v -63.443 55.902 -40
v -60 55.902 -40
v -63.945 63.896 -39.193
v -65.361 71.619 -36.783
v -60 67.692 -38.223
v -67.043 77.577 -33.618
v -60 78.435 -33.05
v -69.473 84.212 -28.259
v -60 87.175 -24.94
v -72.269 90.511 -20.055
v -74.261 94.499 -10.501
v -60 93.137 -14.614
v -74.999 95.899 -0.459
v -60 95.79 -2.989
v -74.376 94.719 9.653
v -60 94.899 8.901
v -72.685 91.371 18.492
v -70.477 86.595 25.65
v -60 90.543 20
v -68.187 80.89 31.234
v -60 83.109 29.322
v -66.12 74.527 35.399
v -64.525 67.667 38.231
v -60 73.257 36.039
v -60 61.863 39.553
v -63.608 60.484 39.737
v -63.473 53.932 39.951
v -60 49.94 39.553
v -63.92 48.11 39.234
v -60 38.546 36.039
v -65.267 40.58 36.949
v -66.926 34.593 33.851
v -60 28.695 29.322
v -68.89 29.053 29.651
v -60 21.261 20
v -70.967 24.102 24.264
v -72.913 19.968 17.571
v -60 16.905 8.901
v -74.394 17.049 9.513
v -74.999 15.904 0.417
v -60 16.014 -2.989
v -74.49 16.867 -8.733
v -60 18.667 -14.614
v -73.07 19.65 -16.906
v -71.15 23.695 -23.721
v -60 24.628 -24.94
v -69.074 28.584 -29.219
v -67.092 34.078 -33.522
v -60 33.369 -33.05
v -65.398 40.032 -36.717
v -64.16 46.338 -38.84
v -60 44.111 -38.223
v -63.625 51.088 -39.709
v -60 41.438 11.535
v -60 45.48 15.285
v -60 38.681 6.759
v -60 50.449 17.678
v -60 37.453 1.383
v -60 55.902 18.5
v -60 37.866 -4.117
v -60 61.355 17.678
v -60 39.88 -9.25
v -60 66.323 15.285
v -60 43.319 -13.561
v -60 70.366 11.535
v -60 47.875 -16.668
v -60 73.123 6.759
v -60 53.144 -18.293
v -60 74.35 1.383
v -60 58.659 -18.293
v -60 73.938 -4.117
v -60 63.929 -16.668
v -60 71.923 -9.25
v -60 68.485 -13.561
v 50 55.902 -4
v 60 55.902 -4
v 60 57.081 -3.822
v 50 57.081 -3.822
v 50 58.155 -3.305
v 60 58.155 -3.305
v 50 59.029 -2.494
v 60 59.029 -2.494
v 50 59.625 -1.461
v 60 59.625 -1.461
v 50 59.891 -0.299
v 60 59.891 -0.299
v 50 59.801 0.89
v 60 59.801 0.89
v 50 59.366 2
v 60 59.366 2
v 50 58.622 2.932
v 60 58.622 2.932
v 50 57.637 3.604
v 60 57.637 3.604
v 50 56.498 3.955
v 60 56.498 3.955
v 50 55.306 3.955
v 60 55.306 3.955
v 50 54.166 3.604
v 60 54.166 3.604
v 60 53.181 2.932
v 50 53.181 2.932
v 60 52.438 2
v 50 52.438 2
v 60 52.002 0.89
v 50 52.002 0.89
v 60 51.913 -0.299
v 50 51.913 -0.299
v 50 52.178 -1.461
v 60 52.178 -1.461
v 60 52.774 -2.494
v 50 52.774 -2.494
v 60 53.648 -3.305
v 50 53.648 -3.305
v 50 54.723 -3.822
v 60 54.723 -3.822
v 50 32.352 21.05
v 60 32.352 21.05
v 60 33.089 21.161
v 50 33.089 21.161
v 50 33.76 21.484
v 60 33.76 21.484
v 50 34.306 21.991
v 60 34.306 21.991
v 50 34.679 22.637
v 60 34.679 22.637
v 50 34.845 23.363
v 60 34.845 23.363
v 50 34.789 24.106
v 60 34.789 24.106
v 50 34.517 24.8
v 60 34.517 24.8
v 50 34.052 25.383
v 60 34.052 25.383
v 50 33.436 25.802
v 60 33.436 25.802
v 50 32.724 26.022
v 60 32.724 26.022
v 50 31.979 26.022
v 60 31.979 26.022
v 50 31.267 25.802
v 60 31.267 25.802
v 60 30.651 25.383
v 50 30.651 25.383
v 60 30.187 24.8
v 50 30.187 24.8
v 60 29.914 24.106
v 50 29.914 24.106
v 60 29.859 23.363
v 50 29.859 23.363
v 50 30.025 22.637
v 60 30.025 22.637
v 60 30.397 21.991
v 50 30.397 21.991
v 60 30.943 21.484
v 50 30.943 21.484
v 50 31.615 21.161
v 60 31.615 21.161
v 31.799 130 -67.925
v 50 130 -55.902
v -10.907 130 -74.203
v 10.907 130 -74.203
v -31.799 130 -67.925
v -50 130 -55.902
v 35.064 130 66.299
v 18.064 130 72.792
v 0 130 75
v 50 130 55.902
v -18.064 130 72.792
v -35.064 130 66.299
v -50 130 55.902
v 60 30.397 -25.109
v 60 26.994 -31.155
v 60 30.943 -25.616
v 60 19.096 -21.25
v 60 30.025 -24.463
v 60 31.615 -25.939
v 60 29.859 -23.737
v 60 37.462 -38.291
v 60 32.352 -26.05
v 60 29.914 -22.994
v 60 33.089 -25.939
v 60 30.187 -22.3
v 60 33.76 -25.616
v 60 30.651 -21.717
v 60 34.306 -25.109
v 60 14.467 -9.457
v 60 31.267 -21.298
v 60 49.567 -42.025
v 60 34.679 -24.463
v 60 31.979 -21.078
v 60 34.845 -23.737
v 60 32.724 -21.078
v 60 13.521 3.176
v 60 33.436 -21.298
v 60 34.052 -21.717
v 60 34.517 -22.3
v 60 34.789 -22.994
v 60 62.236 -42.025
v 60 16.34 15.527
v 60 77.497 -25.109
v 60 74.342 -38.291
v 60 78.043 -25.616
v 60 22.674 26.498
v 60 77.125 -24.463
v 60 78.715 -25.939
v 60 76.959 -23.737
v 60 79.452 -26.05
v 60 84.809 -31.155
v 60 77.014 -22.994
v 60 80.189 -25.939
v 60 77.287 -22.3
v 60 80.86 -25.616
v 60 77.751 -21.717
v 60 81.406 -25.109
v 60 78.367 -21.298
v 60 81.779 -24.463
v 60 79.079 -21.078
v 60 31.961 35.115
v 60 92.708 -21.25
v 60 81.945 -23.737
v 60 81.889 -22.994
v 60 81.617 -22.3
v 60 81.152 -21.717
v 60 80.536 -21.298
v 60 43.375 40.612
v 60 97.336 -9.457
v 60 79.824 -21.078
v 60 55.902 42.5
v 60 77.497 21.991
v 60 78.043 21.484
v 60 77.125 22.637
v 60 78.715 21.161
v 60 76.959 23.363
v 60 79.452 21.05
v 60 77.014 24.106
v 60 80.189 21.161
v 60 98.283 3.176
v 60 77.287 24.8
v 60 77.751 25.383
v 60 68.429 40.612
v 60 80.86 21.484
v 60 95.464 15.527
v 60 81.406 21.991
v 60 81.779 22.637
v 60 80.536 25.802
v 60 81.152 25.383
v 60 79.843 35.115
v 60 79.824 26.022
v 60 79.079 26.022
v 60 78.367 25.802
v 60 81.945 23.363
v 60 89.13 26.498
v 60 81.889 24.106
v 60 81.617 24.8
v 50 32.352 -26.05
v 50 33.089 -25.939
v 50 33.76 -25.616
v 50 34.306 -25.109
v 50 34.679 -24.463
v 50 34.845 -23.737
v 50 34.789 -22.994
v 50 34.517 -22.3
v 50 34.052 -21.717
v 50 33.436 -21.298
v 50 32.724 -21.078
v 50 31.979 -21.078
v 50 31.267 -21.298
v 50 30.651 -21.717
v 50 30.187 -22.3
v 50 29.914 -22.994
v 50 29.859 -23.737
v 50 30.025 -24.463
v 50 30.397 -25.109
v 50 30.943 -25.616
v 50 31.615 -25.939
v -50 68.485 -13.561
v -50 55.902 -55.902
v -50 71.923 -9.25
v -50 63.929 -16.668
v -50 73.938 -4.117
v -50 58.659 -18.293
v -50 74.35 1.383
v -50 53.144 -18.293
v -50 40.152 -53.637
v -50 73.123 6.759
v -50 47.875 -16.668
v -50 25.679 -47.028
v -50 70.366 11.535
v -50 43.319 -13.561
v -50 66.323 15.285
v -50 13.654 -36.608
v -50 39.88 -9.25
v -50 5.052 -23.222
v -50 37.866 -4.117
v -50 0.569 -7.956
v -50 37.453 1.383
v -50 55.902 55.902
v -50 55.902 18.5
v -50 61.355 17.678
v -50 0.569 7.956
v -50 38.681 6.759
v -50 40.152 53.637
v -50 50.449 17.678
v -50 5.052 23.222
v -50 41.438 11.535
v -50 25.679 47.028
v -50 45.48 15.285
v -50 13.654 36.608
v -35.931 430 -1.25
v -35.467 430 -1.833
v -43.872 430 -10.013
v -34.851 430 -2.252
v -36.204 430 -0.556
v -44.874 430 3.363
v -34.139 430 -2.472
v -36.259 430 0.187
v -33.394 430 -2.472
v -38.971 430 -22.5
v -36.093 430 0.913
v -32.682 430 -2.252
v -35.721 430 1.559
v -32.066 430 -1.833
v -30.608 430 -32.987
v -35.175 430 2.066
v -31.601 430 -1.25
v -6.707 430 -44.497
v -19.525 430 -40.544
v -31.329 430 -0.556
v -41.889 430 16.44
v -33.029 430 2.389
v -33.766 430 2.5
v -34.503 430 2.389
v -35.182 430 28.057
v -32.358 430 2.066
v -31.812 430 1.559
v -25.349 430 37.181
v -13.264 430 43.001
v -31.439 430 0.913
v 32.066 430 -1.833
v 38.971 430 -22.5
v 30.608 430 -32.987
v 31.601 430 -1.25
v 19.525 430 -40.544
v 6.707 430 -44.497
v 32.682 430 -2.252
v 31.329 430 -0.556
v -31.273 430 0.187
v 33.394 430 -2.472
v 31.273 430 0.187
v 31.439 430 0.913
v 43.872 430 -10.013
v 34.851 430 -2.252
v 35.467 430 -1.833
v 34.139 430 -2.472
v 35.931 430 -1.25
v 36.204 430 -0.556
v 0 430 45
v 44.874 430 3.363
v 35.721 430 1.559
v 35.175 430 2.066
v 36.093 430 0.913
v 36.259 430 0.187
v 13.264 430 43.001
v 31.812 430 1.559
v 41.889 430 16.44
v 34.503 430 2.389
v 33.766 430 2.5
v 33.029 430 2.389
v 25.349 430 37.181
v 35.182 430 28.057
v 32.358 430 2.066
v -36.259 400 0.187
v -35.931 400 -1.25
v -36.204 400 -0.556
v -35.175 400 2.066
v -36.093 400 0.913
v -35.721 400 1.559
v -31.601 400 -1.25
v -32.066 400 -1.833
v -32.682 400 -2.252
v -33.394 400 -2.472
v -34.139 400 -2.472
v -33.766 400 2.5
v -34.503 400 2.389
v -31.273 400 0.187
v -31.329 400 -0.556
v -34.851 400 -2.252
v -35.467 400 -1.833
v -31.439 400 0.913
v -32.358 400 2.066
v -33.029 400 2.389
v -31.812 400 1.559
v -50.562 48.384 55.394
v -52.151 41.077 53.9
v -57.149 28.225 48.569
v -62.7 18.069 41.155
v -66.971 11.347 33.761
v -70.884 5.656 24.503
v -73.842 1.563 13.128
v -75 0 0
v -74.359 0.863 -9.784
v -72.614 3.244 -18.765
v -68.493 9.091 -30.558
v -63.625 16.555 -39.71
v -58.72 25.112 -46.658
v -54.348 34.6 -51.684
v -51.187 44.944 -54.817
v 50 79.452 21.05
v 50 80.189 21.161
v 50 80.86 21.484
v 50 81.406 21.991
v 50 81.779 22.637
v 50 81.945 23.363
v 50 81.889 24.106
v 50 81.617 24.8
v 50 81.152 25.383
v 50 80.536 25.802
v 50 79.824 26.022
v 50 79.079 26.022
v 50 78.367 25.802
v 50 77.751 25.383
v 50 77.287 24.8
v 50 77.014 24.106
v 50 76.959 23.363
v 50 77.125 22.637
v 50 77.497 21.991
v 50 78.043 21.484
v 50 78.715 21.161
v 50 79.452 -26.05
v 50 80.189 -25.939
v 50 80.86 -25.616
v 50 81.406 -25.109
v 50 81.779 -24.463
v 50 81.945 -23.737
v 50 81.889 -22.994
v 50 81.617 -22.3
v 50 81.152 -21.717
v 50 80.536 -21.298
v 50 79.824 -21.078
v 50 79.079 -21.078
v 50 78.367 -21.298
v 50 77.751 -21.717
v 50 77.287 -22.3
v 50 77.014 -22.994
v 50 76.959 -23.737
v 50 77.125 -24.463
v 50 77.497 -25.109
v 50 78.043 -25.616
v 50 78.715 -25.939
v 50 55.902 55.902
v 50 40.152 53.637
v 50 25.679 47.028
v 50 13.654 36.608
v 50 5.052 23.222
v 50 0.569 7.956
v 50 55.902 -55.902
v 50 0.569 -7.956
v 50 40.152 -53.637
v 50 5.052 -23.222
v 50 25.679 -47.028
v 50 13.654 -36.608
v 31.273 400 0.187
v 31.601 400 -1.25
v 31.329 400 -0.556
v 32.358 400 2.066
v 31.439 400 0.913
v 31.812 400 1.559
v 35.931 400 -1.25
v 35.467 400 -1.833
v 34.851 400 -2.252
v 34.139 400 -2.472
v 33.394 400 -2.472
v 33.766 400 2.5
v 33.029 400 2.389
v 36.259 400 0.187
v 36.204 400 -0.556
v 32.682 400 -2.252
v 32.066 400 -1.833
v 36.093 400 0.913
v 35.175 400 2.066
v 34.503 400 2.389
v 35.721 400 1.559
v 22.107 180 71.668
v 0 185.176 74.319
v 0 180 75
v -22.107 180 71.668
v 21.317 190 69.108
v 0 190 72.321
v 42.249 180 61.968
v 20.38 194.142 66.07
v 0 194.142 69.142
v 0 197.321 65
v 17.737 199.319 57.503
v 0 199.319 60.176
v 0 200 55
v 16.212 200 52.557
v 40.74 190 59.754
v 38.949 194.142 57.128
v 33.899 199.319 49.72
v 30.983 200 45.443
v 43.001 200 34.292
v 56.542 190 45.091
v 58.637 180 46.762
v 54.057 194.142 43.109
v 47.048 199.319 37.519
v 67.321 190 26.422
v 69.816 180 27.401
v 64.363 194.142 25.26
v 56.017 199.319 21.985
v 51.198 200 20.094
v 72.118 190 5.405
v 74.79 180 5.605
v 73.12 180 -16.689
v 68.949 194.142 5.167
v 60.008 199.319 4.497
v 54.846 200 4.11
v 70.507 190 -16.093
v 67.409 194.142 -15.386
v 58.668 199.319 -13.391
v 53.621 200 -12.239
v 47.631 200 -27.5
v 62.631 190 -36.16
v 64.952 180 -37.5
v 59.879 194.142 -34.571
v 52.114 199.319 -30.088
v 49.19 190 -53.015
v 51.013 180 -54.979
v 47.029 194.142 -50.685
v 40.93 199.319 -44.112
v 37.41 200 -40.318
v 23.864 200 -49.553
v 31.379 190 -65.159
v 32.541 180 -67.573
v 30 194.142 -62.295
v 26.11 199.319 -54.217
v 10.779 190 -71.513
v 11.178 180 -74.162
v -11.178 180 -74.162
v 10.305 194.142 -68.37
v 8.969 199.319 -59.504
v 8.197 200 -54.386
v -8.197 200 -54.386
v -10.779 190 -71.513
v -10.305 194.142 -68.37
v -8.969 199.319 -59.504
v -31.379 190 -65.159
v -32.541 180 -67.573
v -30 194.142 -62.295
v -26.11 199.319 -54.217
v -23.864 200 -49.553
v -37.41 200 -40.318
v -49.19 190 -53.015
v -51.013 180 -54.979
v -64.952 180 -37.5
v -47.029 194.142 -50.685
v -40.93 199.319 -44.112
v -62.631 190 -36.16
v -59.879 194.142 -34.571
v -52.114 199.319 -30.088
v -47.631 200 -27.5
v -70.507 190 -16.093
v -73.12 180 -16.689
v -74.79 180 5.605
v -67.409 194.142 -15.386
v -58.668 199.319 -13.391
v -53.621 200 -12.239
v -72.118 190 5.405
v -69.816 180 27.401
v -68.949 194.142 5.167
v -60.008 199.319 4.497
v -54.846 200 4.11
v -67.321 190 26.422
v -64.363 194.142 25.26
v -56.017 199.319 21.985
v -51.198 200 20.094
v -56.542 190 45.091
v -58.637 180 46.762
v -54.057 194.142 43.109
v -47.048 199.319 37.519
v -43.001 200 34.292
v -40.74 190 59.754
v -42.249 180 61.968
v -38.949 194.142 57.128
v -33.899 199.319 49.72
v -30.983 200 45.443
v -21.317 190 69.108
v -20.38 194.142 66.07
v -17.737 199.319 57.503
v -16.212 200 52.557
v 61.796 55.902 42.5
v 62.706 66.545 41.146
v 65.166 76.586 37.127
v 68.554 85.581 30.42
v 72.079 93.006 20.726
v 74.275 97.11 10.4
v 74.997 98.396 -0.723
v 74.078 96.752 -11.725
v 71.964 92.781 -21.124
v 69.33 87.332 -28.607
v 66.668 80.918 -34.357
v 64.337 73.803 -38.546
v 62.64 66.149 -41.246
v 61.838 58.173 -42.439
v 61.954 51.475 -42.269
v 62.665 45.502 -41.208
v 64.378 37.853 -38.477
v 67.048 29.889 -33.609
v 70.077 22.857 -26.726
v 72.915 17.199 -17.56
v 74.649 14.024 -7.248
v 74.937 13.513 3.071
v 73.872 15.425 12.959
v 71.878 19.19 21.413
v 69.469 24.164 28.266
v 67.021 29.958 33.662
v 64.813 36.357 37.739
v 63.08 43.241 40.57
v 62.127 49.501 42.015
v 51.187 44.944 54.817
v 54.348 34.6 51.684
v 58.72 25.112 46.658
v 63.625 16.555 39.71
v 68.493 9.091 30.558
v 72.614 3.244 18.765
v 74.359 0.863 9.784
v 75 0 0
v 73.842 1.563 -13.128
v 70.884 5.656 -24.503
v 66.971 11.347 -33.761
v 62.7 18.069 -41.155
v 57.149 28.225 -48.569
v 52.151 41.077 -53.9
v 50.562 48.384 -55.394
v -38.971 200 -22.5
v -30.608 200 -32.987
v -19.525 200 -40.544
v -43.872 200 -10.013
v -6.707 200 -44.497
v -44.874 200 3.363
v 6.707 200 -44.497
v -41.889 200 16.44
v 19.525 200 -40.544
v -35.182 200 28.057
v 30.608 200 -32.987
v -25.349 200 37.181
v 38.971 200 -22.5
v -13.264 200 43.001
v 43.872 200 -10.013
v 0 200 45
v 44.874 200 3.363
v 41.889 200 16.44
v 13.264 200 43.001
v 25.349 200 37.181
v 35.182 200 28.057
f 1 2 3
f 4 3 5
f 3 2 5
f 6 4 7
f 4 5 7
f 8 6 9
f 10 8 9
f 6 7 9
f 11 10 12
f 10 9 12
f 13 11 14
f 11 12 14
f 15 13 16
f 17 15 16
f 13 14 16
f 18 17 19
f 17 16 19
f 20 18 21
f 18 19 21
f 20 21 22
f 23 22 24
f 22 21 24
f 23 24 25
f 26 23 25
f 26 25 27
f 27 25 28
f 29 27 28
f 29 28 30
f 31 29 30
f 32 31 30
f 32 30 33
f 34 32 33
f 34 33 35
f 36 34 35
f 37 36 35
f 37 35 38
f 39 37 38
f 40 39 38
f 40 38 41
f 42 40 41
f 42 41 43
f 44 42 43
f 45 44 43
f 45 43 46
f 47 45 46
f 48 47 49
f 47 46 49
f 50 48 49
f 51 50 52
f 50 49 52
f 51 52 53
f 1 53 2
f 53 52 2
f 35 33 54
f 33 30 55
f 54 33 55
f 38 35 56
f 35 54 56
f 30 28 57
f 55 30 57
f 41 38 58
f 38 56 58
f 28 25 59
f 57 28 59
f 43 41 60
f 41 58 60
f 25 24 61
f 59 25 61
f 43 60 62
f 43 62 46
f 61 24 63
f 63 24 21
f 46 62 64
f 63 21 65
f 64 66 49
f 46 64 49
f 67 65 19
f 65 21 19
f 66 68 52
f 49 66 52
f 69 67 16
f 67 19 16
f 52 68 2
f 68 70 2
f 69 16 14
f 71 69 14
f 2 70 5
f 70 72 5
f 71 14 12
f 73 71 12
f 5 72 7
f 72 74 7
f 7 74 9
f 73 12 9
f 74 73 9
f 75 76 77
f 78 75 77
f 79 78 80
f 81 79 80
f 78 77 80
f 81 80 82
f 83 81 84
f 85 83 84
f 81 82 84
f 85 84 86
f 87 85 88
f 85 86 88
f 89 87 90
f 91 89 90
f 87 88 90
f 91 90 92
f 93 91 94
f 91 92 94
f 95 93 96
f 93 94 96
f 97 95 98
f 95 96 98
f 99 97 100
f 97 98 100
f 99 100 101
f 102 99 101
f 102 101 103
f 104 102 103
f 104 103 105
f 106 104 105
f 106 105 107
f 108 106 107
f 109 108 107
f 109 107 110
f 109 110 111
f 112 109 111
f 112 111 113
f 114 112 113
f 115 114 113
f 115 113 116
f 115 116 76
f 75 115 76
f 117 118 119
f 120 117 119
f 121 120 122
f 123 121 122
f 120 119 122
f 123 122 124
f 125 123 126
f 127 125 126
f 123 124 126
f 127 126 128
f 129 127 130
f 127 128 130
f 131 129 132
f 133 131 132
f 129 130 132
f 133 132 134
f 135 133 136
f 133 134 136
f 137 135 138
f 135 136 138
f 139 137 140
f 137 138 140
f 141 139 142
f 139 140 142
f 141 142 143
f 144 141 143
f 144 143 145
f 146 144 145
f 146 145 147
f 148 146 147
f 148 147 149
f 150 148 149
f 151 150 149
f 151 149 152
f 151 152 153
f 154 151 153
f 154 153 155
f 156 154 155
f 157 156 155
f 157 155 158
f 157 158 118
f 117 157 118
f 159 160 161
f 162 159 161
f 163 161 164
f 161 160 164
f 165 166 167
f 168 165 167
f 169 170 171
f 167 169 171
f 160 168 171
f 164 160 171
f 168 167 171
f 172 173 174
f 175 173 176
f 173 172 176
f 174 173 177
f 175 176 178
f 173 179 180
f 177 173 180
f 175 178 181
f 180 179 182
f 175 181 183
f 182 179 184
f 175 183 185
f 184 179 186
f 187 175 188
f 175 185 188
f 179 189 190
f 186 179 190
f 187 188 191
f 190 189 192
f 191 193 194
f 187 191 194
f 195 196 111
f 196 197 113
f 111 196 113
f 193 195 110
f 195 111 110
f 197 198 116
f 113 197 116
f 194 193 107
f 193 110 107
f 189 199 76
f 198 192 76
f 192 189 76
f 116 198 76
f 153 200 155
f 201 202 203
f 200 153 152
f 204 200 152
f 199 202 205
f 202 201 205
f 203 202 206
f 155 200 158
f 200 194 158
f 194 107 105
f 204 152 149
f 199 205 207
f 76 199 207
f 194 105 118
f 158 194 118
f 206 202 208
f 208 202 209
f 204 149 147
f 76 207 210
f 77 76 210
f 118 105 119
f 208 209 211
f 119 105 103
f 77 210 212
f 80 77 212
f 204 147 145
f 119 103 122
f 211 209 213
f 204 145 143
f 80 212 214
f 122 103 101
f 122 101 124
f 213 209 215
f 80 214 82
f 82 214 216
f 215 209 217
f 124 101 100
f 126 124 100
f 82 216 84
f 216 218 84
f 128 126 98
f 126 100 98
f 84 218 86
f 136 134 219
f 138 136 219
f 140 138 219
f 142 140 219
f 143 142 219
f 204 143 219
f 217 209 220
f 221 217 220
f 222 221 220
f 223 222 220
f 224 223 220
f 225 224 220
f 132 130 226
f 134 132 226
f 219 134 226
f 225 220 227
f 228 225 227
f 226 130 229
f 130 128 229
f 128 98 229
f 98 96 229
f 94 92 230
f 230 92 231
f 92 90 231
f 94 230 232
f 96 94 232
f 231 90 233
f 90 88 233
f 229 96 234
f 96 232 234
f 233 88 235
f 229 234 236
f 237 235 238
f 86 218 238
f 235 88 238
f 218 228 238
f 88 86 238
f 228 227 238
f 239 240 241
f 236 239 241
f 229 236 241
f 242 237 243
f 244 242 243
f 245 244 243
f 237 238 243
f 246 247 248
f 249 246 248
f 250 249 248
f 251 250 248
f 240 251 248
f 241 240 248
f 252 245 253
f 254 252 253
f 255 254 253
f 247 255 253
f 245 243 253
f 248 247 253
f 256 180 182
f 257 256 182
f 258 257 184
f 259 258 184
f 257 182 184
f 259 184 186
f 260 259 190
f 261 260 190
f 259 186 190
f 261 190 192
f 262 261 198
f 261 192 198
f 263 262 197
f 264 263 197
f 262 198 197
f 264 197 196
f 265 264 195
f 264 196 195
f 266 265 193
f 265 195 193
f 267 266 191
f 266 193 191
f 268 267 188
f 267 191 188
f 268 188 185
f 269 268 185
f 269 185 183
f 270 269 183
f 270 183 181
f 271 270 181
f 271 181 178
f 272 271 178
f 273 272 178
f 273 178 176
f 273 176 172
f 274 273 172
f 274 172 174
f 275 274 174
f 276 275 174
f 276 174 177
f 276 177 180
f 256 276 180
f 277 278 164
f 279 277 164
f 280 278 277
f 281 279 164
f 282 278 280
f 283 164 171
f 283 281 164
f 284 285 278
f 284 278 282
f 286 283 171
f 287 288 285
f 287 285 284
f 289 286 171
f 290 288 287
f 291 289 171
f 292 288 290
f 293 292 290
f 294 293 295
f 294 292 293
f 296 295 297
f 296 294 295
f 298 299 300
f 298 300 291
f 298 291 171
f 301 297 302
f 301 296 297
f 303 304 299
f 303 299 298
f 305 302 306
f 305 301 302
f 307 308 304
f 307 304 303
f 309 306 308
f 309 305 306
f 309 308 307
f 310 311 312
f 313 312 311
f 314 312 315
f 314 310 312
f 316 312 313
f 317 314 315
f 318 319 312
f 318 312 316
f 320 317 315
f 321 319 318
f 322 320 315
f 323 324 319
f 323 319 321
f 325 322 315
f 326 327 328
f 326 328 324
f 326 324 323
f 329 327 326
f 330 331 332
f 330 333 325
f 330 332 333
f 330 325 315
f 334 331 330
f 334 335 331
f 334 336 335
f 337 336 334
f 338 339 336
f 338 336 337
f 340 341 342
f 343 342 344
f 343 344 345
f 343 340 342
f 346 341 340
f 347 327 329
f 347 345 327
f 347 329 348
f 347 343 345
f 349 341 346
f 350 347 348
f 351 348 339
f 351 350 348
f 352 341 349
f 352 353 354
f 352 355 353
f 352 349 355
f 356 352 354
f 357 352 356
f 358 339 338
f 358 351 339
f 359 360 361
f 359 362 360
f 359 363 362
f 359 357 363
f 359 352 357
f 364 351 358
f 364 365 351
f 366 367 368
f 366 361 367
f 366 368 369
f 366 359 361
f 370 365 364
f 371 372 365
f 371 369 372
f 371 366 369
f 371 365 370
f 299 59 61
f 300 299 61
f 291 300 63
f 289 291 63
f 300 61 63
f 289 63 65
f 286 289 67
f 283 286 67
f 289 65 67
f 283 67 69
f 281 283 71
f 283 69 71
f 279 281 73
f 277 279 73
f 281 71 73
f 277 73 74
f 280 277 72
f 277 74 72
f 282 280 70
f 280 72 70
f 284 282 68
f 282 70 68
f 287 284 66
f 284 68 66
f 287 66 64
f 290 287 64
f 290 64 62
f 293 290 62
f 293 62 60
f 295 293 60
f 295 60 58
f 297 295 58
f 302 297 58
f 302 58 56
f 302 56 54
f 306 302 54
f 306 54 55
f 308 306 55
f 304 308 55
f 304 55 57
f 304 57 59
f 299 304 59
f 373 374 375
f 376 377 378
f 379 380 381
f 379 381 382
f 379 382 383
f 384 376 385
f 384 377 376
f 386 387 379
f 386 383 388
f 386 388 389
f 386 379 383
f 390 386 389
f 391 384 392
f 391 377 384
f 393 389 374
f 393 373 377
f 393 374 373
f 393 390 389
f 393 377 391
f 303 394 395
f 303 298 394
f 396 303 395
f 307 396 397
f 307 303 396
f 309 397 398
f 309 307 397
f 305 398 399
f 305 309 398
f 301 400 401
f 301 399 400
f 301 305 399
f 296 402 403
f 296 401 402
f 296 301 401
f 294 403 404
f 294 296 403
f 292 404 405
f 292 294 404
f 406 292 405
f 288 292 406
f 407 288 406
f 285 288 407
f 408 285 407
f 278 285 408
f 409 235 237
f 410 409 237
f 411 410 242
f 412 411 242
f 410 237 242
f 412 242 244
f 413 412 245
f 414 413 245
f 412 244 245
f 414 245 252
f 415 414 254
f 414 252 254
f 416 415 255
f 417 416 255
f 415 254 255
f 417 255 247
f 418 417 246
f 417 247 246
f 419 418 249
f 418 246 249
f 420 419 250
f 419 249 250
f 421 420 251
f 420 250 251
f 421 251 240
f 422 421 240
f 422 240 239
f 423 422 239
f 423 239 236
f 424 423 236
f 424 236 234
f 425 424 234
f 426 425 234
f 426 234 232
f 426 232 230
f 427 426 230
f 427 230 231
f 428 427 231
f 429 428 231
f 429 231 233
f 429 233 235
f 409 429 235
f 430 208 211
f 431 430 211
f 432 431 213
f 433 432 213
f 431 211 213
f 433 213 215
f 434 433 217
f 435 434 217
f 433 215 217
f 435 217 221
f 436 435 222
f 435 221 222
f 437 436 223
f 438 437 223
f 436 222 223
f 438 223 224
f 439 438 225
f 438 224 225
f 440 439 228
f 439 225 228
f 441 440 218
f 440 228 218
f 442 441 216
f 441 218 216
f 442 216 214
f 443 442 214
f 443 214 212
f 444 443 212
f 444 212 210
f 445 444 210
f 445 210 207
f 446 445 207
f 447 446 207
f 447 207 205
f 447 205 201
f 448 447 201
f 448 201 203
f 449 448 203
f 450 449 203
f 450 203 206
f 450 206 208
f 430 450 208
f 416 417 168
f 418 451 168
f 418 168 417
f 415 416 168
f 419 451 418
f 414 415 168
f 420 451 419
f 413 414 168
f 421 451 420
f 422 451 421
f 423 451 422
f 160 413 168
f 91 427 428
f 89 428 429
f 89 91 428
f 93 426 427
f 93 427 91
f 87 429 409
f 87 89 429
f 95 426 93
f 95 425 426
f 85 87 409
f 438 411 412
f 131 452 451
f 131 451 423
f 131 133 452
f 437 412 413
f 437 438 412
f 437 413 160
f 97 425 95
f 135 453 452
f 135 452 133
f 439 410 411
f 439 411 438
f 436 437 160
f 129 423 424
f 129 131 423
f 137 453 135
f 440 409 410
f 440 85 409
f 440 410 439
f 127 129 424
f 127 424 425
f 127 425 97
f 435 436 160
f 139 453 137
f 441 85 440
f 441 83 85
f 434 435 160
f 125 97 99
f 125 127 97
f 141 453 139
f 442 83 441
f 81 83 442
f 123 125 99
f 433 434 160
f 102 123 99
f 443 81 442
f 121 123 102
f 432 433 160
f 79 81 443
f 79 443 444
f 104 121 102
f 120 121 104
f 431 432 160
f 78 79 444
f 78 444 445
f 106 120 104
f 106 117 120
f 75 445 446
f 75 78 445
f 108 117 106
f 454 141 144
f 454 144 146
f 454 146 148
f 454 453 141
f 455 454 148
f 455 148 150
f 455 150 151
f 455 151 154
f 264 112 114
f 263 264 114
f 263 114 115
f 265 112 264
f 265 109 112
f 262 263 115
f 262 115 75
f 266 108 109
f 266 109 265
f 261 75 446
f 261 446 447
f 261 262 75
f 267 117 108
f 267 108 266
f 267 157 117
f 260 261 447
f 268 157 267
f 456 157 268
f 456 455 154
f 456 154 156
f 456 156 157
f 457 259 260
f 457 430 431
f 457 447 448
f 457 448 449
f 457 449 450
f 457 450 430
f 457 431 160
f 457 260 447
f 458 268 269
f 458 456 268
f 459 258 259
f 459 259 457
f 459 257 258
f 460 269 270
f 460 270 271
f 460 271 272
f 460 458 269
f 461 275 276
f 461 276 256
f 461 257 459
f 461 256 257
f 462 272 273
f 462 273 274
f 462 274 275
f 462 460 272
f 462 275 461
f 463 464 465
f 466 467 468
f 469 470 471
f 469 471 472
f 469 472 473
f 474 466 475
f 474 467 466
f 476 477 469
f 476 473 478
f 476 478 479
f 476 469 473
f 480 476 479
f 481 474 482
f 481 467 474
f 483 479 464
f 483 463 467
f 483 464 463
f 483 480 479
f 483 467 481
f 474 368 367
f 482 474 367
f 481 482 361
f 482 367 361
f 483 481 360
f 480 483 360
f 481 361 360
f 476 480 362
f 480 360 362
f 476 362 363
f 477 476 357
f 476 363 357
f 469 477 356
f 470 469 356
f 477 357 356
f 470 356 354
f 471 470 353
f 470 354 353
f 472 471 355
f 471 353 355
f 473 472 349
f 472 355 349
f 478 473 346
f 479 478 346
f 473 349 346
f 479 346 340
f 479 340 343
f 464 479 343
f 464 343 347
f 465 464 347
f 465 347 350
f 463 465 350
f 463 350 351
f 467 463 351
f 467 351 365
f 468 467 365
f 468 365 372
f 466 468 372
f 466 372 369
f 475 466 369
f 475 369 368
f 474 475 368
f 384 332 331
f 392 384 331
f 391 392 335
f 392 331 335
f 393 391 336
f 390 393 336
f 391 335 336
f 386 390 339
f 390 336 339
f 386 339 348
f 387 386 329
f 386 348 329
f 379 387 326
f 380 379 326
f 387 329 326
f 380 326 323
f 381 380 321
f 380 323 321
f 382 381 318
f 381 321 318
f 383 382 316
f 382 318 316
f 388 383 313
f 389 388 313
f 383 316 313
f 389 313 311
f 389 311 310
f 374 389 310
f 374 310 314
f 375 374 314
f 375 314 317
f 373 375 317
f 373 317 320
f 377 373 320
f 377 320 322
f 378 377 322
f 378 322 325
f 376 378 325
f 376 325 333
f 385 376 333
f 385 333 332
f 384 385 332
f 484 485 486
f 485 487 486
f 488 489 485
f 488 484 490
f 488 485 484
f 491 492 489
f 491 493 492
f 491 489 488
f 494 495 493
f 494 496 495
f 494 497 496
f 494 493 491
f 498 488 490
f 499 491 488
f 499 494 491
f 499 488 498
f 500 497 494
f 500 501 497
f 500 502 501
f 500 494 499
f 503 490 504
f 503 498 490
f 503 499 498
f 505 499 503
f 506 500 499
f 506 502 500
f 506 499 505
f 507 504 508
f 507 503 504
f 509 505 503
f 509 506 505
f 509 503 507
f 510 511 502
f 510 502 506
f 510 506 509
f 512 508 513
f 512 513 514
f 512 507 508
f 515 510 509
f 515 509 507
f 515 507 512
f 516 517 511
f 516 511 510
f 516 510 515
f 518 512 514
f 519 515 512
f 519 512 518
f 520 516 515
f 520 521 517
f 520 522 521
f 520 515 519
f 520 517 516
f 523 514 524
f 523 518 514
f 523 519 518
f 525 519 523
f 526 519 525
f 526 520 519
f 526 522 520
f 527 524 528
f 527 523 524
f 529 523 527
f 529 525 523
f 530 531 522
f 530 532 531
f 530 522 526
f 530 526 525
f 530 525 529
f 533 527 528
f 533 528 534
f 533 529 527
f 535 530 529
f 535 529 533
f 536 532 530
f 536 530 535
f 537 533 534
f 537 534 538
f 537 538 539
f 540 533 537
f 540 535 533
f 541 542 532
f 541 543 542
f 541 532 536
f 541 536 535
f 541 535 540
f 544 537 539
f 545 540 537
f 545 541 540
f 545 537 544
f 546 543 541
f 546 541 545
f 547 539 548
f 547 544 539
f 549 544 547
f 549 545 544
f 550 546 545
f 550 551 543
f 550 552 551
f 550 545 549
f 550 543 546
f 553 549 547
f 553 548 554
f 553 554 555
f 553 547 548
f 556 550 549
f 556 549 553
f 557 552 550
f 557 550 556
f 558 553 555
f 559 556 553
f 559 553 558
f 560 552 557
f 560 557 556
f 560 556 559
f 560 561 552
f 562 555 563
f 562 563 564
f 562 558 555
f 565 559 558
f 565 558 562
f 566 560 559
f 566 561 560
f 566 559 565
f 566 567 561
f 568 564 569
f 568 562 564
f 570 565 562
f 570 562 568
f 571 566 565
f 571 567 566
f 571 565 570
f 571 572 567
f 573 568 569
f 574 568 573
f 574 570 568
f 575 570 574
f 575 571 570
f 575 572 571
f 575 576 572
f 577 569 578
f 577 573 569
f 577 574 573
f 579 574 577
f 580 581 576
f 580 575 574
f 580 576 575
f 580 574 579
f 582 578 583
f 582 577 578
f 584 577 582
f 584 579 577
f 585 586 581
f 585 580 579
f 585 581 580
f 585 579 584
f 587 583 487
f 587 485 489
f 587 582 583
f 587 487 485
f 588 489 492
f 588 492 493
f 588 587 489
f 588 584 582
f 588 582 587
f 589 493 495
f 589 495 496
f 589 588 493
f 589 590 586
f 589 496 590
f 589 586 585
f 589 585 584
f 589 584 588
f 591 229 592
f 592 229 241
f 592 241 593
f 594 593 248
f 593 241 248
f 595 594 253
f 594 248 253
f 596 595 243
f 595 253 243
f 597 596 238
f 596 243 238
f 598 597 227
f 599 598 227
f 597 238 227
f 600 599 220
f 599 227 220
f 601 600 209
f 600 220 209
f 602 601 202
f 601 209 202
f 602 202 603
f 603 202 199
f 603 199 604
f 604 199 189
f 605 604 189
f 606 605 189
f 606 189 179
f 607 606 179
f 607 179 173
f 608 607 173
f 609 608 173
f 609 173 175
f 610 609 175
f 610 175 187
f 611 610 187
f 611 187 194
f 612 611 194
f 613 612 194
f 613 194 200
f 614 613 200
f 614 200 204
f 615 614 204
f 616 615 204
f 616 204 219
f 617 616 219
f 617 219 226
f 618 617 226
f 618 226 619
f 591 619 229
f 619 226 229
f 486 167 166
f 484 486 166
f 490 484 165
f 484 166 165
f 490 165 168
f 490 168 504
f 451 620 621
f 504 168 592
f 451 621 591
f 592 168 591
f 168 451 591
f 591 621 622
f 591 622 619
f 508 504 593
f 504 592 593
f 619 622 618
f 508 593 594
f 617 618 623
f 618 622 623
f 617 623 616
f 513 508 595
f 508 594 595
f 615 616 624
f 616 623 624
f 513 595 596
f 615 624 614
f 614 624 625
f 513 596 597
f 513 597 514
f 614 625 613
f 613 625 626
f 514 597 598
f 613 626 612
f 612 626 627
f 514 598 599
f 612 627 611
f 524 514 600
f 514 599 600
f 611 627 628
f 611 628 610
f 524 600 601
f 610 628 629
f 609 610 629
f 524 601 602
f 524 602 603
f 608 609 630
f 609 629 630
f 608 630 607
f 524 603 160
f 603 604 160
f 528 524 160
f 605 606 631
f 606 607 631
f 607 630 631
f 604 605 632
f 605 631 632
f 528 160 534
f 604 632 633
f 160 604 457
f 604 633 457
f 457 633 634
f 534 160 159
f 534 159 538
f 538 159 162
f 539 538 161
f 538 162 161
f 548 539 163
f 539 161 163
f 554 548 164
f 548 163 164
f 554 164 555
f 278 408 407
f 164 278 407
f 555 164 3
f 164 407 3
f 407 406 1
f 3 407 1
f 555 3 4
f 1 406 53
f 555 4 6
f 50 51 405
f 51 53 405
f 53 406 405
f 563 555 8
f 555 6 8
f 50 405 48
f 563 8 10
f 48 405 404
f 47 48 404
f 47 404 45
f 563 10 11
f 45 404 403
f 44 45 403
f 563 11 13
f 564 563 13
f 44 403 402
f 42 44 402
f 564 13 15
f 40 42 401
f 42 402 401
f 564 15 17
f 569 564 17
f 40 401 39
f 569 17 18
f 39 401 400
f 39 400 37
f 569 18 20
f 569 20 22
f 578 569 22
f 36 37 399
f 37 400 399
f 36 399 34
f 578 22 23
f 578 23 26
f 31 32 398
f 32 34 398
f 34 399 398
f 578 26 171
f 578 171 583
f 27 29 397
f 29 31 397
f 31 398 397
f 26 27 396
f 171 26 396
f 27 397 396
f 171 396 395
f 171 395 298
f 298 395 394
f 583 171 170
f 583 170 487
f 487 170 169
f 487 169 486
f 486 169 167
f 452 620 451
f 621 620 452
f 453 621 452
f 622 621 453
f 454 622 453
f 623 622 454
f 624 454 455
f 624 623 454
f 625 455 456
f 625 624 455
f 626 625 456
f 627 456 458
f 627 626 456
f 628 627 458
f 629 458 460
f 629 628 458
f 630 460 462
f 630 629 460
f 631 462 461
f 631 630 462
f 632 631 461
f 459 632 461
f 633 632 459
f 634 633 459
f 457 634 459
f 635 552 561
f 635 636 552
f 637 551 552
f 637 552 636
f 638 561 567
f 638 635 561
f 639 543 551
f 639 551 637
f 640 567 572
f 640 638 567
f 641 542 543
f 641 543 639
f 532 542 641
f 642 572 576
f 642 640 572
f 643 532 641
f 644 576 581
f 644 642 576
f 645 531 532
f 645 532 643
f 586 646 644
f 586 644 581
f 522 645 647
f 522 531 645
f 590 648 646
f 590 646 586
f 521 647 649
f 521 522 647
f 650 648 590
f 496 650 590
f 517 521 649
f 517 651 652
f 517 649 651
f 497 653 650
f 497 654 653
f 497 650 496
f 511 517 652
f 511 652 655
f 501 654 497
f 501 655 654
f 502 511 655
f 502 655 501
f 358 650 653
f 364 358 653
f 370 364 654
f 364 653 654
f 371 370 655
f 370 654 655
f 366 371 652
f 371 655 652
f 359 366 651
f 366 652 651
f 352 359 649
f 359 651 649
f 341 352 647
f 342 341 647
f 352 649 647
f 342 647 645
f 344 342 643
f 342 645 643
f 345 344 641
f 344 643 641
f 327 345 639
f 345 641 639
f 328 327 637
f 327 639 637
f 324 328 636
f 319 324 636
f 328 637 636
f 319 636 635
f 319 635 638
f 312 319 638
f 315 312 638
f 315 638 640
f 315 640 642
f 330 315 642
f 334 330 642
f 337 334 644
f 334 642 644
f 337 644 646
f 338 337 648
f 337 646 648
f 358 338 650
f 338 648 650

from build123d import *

# Parameters (mm, degrees)
SKETCH1_R               = 75
BOSS_EXTRUDE1_DEPTH     = 200
CUT_EXTRUDE1_DEPTH      = 130
SKETCH3_R               = 45
BOSS_EXTRUDE2_DEPTH     = 230
FILLET2_R               = 20
CUT_EXTRUDE2_DEPTH      = 230
CUT_EXTRUDE2_DEPTH_BACK = 230
CUT_EXTRUDE3_START      = -10
SKETCH5_R               = 42.5
CUT_EXTRUDE3_DEPTH      = 20
CUT_EXTRUDE4_START      = -10
SKETCH6_R               = 40
CUT_EXTRUDE4_DEPTH      = 20
SKETCH7_R               = 16
CUT_EXTRUDE5_DEPTH      = 20
SKETCH8_R               = 4
CUT_EXTRUDE6_DEPTH      = 20
SKETCH9_R               = 18.5
CUT_EXTRUDE7_DEPTH      = 40
SKETCH10_R              = 2.5
CUT_EXTRUDE8_DEPTH      = 40
SKETCH11_R              = 2.5
CUT_EXTRUDE9_DEPTH      = 40


with BuildPart() as part:
    # Sketch1 → Boss-Extrude1 (new body)
    with BuildSketch(Plane(origin=(0, 0, 0), x_dir=(1, 0, 0), z_dir=(0, 1, 0))):
        Circle(SKETCH1_R)
    extrude(amount=BOSS_EXTRUDE1_DEPTH)

    # Sketch2 → Cut-Extrude1 (cut)
    with BuildSketch(Plane.XZ):
        with BuildLine():
            Line((-50, -55.901699437), (-50, 55.901699437))
            ThreePointArc((-50, 55.901699437), (0, 75), (50, 55.901699437))
            Line((50, 55.901699437), (50, -55.901699437))
            ThreePointArc((50, -55.901699437), (0, -75), (-50, -55.901699437))
        make_face()
    extrude(amount=-CUT_EXTRUDE1_DEPTH, mode=Mode.SUBTRACT)

    # Sketch3 → Boss-Extrude2 (add)
    with BuildSketch(Plane(origin=(0, 200, 0), x_dir=(1, 0, 0), z_dir=(0, 1, 0))):
        Circle(SKETCH3_R)
    extrude(amount=BOSS_EXTRUDE2_DEPTH)

    # Fillet2
    fillet2_edges = [part.edges().sort_by_distance(p)[0] for p in [
        (-75, 200, 0),
    ]]
    fillet(fillet2_edges, radius=FILLET2_R)

    # Sketch4 → Cut-Extrude2 (cut, two sides: drawn at the far end of the back side and taken through both)
    with BuildSketch(Plane.ZY.offset(-50).offset(-CUT_EXTRUDE2_DEPTH_BACK)):
        with BuildLine():
            Line((-55.901699437, 55.901699437), (-55.901699437, 0))
            Line((-55.901699437, 0), (9.3e-08, 0))
            ThreePointArc((9.3e-08, 0), (-39.528470719, 16.373228653), (-55.901699437, 55.901699437))
        make_face()
        with BuildLine():
            ThreePointArc((55.901699437, 55.901699437), (39.528470785, 16.373228718), (9.3e-08, 0))
            Line((9.3e-08, 0), (55.901699437, 0))
            Line((55.901699437, 0), (55.901699437, 55.901699437))
        make_face()
    extrude(amount=CUT_EXTRUDE2_DEPTH + CUT_EXTRUDE2_DEPTH_BACK, mode=Mode.SUBTRACT)

    # Sketch5 → Cut-Extrude3 (cut)
    with BuildSketch(Plane.ZY.offset(-50).offset(CUT_EXTRUDE3_START)):
        with Locations((0, 55.901699437)):
            Circle(SKETCH5_R)
    extrude(amount=-CUT_EXTRUDE3_DEPTH, mode=Mode.SUBTRACT)

    # Sketch6 → Cut-Extrude4 (cut)
    with BuildSketch(Plane(origin=(-50, 0, 0), x_dir=(0, 0, -1), z_dir=(1, 0, 0)).offset(CUT_EXTRUDE4_START)):
        with Locations((0, 55.901699437)):
            Circle(SKETCH6_R)
    extrude(amount=-CUT_EXTRUDE4_DEPTH, mode=Mode.SUBTRACT)

    # Sketch7 → Cut-Extrude5 (cut)
    with BuildSketch(Plane.ZY.offset(60)):
        with Locations((0, 55.901699437)):
            Circle(SKETCH7_R)
    extrude(amount=-CUT_EXTRUDE5_DEPTH, mode=Mode.SUBTRACT)

    # Sketch8 → Cut-Extrude6 (cut)
    with BuildSketch(Plane(origin=(60, 0, 0), x_dir=(0, 0, -1), z_dir=(1, 0, 0))):
        with Locations((0, 55.901699438)):
            Circle(SKETCH8_R)
    extrude(amount=-CUT_EXTRUDE6_DEPTH, mode=Mode.SUBTRACT)

    # Sketch9 → Cut-Extrude7 (cut)
    with BuildSketch(Plane.ZY.offset(60)):
        with Locations((0, 55.901699438)):
            Circle(SKETCH9_R)
    extrude(amount=-CUT_EXTRUDE7_DEPTH, mode=Mode.SUBTRACT)

    # Sketch10 → Cut-Extrude8 (cut)
    with BuildSketch(Plane(origin=(60, 0, 0), x_dir=(0, 0, -1), z_dir=(1, 0, 0))):
        with Locations((-23.55, 32.351699437)):
            Circle(SKETCH10_R)
        with Locations((23.55, 32.351699437)):
            Circle(SKETCH10_R)
        with Locations((23.55, 79.451699437)):
            Circle(SKETCH10_R)
        with Locations((-23.55, 79.451699437)):
            Circle(SKETCH10_R)
    extrude(amount=-CUT_EXTRUDE8_DEPTH, mode=Mode.SUBTRACT)

    # Sketch11 → Cut-Extrude9 (cut)
    with BuildSketch(Plane(origin=(0, 440, 0), x_dir=(1, 0, 0), z_dir=(0, 1, 0))):
        with Locations((-33.766216589, 0)):
            Circle(SKETCH11_R)
        with Locations((33.766216589, 0)):
            Circle(SKETCH11_R)
    extrude(amount=-CUT_EXTRUDE9_DEPTH, mode=Mode.SUBTRACT)


solid = part.part
